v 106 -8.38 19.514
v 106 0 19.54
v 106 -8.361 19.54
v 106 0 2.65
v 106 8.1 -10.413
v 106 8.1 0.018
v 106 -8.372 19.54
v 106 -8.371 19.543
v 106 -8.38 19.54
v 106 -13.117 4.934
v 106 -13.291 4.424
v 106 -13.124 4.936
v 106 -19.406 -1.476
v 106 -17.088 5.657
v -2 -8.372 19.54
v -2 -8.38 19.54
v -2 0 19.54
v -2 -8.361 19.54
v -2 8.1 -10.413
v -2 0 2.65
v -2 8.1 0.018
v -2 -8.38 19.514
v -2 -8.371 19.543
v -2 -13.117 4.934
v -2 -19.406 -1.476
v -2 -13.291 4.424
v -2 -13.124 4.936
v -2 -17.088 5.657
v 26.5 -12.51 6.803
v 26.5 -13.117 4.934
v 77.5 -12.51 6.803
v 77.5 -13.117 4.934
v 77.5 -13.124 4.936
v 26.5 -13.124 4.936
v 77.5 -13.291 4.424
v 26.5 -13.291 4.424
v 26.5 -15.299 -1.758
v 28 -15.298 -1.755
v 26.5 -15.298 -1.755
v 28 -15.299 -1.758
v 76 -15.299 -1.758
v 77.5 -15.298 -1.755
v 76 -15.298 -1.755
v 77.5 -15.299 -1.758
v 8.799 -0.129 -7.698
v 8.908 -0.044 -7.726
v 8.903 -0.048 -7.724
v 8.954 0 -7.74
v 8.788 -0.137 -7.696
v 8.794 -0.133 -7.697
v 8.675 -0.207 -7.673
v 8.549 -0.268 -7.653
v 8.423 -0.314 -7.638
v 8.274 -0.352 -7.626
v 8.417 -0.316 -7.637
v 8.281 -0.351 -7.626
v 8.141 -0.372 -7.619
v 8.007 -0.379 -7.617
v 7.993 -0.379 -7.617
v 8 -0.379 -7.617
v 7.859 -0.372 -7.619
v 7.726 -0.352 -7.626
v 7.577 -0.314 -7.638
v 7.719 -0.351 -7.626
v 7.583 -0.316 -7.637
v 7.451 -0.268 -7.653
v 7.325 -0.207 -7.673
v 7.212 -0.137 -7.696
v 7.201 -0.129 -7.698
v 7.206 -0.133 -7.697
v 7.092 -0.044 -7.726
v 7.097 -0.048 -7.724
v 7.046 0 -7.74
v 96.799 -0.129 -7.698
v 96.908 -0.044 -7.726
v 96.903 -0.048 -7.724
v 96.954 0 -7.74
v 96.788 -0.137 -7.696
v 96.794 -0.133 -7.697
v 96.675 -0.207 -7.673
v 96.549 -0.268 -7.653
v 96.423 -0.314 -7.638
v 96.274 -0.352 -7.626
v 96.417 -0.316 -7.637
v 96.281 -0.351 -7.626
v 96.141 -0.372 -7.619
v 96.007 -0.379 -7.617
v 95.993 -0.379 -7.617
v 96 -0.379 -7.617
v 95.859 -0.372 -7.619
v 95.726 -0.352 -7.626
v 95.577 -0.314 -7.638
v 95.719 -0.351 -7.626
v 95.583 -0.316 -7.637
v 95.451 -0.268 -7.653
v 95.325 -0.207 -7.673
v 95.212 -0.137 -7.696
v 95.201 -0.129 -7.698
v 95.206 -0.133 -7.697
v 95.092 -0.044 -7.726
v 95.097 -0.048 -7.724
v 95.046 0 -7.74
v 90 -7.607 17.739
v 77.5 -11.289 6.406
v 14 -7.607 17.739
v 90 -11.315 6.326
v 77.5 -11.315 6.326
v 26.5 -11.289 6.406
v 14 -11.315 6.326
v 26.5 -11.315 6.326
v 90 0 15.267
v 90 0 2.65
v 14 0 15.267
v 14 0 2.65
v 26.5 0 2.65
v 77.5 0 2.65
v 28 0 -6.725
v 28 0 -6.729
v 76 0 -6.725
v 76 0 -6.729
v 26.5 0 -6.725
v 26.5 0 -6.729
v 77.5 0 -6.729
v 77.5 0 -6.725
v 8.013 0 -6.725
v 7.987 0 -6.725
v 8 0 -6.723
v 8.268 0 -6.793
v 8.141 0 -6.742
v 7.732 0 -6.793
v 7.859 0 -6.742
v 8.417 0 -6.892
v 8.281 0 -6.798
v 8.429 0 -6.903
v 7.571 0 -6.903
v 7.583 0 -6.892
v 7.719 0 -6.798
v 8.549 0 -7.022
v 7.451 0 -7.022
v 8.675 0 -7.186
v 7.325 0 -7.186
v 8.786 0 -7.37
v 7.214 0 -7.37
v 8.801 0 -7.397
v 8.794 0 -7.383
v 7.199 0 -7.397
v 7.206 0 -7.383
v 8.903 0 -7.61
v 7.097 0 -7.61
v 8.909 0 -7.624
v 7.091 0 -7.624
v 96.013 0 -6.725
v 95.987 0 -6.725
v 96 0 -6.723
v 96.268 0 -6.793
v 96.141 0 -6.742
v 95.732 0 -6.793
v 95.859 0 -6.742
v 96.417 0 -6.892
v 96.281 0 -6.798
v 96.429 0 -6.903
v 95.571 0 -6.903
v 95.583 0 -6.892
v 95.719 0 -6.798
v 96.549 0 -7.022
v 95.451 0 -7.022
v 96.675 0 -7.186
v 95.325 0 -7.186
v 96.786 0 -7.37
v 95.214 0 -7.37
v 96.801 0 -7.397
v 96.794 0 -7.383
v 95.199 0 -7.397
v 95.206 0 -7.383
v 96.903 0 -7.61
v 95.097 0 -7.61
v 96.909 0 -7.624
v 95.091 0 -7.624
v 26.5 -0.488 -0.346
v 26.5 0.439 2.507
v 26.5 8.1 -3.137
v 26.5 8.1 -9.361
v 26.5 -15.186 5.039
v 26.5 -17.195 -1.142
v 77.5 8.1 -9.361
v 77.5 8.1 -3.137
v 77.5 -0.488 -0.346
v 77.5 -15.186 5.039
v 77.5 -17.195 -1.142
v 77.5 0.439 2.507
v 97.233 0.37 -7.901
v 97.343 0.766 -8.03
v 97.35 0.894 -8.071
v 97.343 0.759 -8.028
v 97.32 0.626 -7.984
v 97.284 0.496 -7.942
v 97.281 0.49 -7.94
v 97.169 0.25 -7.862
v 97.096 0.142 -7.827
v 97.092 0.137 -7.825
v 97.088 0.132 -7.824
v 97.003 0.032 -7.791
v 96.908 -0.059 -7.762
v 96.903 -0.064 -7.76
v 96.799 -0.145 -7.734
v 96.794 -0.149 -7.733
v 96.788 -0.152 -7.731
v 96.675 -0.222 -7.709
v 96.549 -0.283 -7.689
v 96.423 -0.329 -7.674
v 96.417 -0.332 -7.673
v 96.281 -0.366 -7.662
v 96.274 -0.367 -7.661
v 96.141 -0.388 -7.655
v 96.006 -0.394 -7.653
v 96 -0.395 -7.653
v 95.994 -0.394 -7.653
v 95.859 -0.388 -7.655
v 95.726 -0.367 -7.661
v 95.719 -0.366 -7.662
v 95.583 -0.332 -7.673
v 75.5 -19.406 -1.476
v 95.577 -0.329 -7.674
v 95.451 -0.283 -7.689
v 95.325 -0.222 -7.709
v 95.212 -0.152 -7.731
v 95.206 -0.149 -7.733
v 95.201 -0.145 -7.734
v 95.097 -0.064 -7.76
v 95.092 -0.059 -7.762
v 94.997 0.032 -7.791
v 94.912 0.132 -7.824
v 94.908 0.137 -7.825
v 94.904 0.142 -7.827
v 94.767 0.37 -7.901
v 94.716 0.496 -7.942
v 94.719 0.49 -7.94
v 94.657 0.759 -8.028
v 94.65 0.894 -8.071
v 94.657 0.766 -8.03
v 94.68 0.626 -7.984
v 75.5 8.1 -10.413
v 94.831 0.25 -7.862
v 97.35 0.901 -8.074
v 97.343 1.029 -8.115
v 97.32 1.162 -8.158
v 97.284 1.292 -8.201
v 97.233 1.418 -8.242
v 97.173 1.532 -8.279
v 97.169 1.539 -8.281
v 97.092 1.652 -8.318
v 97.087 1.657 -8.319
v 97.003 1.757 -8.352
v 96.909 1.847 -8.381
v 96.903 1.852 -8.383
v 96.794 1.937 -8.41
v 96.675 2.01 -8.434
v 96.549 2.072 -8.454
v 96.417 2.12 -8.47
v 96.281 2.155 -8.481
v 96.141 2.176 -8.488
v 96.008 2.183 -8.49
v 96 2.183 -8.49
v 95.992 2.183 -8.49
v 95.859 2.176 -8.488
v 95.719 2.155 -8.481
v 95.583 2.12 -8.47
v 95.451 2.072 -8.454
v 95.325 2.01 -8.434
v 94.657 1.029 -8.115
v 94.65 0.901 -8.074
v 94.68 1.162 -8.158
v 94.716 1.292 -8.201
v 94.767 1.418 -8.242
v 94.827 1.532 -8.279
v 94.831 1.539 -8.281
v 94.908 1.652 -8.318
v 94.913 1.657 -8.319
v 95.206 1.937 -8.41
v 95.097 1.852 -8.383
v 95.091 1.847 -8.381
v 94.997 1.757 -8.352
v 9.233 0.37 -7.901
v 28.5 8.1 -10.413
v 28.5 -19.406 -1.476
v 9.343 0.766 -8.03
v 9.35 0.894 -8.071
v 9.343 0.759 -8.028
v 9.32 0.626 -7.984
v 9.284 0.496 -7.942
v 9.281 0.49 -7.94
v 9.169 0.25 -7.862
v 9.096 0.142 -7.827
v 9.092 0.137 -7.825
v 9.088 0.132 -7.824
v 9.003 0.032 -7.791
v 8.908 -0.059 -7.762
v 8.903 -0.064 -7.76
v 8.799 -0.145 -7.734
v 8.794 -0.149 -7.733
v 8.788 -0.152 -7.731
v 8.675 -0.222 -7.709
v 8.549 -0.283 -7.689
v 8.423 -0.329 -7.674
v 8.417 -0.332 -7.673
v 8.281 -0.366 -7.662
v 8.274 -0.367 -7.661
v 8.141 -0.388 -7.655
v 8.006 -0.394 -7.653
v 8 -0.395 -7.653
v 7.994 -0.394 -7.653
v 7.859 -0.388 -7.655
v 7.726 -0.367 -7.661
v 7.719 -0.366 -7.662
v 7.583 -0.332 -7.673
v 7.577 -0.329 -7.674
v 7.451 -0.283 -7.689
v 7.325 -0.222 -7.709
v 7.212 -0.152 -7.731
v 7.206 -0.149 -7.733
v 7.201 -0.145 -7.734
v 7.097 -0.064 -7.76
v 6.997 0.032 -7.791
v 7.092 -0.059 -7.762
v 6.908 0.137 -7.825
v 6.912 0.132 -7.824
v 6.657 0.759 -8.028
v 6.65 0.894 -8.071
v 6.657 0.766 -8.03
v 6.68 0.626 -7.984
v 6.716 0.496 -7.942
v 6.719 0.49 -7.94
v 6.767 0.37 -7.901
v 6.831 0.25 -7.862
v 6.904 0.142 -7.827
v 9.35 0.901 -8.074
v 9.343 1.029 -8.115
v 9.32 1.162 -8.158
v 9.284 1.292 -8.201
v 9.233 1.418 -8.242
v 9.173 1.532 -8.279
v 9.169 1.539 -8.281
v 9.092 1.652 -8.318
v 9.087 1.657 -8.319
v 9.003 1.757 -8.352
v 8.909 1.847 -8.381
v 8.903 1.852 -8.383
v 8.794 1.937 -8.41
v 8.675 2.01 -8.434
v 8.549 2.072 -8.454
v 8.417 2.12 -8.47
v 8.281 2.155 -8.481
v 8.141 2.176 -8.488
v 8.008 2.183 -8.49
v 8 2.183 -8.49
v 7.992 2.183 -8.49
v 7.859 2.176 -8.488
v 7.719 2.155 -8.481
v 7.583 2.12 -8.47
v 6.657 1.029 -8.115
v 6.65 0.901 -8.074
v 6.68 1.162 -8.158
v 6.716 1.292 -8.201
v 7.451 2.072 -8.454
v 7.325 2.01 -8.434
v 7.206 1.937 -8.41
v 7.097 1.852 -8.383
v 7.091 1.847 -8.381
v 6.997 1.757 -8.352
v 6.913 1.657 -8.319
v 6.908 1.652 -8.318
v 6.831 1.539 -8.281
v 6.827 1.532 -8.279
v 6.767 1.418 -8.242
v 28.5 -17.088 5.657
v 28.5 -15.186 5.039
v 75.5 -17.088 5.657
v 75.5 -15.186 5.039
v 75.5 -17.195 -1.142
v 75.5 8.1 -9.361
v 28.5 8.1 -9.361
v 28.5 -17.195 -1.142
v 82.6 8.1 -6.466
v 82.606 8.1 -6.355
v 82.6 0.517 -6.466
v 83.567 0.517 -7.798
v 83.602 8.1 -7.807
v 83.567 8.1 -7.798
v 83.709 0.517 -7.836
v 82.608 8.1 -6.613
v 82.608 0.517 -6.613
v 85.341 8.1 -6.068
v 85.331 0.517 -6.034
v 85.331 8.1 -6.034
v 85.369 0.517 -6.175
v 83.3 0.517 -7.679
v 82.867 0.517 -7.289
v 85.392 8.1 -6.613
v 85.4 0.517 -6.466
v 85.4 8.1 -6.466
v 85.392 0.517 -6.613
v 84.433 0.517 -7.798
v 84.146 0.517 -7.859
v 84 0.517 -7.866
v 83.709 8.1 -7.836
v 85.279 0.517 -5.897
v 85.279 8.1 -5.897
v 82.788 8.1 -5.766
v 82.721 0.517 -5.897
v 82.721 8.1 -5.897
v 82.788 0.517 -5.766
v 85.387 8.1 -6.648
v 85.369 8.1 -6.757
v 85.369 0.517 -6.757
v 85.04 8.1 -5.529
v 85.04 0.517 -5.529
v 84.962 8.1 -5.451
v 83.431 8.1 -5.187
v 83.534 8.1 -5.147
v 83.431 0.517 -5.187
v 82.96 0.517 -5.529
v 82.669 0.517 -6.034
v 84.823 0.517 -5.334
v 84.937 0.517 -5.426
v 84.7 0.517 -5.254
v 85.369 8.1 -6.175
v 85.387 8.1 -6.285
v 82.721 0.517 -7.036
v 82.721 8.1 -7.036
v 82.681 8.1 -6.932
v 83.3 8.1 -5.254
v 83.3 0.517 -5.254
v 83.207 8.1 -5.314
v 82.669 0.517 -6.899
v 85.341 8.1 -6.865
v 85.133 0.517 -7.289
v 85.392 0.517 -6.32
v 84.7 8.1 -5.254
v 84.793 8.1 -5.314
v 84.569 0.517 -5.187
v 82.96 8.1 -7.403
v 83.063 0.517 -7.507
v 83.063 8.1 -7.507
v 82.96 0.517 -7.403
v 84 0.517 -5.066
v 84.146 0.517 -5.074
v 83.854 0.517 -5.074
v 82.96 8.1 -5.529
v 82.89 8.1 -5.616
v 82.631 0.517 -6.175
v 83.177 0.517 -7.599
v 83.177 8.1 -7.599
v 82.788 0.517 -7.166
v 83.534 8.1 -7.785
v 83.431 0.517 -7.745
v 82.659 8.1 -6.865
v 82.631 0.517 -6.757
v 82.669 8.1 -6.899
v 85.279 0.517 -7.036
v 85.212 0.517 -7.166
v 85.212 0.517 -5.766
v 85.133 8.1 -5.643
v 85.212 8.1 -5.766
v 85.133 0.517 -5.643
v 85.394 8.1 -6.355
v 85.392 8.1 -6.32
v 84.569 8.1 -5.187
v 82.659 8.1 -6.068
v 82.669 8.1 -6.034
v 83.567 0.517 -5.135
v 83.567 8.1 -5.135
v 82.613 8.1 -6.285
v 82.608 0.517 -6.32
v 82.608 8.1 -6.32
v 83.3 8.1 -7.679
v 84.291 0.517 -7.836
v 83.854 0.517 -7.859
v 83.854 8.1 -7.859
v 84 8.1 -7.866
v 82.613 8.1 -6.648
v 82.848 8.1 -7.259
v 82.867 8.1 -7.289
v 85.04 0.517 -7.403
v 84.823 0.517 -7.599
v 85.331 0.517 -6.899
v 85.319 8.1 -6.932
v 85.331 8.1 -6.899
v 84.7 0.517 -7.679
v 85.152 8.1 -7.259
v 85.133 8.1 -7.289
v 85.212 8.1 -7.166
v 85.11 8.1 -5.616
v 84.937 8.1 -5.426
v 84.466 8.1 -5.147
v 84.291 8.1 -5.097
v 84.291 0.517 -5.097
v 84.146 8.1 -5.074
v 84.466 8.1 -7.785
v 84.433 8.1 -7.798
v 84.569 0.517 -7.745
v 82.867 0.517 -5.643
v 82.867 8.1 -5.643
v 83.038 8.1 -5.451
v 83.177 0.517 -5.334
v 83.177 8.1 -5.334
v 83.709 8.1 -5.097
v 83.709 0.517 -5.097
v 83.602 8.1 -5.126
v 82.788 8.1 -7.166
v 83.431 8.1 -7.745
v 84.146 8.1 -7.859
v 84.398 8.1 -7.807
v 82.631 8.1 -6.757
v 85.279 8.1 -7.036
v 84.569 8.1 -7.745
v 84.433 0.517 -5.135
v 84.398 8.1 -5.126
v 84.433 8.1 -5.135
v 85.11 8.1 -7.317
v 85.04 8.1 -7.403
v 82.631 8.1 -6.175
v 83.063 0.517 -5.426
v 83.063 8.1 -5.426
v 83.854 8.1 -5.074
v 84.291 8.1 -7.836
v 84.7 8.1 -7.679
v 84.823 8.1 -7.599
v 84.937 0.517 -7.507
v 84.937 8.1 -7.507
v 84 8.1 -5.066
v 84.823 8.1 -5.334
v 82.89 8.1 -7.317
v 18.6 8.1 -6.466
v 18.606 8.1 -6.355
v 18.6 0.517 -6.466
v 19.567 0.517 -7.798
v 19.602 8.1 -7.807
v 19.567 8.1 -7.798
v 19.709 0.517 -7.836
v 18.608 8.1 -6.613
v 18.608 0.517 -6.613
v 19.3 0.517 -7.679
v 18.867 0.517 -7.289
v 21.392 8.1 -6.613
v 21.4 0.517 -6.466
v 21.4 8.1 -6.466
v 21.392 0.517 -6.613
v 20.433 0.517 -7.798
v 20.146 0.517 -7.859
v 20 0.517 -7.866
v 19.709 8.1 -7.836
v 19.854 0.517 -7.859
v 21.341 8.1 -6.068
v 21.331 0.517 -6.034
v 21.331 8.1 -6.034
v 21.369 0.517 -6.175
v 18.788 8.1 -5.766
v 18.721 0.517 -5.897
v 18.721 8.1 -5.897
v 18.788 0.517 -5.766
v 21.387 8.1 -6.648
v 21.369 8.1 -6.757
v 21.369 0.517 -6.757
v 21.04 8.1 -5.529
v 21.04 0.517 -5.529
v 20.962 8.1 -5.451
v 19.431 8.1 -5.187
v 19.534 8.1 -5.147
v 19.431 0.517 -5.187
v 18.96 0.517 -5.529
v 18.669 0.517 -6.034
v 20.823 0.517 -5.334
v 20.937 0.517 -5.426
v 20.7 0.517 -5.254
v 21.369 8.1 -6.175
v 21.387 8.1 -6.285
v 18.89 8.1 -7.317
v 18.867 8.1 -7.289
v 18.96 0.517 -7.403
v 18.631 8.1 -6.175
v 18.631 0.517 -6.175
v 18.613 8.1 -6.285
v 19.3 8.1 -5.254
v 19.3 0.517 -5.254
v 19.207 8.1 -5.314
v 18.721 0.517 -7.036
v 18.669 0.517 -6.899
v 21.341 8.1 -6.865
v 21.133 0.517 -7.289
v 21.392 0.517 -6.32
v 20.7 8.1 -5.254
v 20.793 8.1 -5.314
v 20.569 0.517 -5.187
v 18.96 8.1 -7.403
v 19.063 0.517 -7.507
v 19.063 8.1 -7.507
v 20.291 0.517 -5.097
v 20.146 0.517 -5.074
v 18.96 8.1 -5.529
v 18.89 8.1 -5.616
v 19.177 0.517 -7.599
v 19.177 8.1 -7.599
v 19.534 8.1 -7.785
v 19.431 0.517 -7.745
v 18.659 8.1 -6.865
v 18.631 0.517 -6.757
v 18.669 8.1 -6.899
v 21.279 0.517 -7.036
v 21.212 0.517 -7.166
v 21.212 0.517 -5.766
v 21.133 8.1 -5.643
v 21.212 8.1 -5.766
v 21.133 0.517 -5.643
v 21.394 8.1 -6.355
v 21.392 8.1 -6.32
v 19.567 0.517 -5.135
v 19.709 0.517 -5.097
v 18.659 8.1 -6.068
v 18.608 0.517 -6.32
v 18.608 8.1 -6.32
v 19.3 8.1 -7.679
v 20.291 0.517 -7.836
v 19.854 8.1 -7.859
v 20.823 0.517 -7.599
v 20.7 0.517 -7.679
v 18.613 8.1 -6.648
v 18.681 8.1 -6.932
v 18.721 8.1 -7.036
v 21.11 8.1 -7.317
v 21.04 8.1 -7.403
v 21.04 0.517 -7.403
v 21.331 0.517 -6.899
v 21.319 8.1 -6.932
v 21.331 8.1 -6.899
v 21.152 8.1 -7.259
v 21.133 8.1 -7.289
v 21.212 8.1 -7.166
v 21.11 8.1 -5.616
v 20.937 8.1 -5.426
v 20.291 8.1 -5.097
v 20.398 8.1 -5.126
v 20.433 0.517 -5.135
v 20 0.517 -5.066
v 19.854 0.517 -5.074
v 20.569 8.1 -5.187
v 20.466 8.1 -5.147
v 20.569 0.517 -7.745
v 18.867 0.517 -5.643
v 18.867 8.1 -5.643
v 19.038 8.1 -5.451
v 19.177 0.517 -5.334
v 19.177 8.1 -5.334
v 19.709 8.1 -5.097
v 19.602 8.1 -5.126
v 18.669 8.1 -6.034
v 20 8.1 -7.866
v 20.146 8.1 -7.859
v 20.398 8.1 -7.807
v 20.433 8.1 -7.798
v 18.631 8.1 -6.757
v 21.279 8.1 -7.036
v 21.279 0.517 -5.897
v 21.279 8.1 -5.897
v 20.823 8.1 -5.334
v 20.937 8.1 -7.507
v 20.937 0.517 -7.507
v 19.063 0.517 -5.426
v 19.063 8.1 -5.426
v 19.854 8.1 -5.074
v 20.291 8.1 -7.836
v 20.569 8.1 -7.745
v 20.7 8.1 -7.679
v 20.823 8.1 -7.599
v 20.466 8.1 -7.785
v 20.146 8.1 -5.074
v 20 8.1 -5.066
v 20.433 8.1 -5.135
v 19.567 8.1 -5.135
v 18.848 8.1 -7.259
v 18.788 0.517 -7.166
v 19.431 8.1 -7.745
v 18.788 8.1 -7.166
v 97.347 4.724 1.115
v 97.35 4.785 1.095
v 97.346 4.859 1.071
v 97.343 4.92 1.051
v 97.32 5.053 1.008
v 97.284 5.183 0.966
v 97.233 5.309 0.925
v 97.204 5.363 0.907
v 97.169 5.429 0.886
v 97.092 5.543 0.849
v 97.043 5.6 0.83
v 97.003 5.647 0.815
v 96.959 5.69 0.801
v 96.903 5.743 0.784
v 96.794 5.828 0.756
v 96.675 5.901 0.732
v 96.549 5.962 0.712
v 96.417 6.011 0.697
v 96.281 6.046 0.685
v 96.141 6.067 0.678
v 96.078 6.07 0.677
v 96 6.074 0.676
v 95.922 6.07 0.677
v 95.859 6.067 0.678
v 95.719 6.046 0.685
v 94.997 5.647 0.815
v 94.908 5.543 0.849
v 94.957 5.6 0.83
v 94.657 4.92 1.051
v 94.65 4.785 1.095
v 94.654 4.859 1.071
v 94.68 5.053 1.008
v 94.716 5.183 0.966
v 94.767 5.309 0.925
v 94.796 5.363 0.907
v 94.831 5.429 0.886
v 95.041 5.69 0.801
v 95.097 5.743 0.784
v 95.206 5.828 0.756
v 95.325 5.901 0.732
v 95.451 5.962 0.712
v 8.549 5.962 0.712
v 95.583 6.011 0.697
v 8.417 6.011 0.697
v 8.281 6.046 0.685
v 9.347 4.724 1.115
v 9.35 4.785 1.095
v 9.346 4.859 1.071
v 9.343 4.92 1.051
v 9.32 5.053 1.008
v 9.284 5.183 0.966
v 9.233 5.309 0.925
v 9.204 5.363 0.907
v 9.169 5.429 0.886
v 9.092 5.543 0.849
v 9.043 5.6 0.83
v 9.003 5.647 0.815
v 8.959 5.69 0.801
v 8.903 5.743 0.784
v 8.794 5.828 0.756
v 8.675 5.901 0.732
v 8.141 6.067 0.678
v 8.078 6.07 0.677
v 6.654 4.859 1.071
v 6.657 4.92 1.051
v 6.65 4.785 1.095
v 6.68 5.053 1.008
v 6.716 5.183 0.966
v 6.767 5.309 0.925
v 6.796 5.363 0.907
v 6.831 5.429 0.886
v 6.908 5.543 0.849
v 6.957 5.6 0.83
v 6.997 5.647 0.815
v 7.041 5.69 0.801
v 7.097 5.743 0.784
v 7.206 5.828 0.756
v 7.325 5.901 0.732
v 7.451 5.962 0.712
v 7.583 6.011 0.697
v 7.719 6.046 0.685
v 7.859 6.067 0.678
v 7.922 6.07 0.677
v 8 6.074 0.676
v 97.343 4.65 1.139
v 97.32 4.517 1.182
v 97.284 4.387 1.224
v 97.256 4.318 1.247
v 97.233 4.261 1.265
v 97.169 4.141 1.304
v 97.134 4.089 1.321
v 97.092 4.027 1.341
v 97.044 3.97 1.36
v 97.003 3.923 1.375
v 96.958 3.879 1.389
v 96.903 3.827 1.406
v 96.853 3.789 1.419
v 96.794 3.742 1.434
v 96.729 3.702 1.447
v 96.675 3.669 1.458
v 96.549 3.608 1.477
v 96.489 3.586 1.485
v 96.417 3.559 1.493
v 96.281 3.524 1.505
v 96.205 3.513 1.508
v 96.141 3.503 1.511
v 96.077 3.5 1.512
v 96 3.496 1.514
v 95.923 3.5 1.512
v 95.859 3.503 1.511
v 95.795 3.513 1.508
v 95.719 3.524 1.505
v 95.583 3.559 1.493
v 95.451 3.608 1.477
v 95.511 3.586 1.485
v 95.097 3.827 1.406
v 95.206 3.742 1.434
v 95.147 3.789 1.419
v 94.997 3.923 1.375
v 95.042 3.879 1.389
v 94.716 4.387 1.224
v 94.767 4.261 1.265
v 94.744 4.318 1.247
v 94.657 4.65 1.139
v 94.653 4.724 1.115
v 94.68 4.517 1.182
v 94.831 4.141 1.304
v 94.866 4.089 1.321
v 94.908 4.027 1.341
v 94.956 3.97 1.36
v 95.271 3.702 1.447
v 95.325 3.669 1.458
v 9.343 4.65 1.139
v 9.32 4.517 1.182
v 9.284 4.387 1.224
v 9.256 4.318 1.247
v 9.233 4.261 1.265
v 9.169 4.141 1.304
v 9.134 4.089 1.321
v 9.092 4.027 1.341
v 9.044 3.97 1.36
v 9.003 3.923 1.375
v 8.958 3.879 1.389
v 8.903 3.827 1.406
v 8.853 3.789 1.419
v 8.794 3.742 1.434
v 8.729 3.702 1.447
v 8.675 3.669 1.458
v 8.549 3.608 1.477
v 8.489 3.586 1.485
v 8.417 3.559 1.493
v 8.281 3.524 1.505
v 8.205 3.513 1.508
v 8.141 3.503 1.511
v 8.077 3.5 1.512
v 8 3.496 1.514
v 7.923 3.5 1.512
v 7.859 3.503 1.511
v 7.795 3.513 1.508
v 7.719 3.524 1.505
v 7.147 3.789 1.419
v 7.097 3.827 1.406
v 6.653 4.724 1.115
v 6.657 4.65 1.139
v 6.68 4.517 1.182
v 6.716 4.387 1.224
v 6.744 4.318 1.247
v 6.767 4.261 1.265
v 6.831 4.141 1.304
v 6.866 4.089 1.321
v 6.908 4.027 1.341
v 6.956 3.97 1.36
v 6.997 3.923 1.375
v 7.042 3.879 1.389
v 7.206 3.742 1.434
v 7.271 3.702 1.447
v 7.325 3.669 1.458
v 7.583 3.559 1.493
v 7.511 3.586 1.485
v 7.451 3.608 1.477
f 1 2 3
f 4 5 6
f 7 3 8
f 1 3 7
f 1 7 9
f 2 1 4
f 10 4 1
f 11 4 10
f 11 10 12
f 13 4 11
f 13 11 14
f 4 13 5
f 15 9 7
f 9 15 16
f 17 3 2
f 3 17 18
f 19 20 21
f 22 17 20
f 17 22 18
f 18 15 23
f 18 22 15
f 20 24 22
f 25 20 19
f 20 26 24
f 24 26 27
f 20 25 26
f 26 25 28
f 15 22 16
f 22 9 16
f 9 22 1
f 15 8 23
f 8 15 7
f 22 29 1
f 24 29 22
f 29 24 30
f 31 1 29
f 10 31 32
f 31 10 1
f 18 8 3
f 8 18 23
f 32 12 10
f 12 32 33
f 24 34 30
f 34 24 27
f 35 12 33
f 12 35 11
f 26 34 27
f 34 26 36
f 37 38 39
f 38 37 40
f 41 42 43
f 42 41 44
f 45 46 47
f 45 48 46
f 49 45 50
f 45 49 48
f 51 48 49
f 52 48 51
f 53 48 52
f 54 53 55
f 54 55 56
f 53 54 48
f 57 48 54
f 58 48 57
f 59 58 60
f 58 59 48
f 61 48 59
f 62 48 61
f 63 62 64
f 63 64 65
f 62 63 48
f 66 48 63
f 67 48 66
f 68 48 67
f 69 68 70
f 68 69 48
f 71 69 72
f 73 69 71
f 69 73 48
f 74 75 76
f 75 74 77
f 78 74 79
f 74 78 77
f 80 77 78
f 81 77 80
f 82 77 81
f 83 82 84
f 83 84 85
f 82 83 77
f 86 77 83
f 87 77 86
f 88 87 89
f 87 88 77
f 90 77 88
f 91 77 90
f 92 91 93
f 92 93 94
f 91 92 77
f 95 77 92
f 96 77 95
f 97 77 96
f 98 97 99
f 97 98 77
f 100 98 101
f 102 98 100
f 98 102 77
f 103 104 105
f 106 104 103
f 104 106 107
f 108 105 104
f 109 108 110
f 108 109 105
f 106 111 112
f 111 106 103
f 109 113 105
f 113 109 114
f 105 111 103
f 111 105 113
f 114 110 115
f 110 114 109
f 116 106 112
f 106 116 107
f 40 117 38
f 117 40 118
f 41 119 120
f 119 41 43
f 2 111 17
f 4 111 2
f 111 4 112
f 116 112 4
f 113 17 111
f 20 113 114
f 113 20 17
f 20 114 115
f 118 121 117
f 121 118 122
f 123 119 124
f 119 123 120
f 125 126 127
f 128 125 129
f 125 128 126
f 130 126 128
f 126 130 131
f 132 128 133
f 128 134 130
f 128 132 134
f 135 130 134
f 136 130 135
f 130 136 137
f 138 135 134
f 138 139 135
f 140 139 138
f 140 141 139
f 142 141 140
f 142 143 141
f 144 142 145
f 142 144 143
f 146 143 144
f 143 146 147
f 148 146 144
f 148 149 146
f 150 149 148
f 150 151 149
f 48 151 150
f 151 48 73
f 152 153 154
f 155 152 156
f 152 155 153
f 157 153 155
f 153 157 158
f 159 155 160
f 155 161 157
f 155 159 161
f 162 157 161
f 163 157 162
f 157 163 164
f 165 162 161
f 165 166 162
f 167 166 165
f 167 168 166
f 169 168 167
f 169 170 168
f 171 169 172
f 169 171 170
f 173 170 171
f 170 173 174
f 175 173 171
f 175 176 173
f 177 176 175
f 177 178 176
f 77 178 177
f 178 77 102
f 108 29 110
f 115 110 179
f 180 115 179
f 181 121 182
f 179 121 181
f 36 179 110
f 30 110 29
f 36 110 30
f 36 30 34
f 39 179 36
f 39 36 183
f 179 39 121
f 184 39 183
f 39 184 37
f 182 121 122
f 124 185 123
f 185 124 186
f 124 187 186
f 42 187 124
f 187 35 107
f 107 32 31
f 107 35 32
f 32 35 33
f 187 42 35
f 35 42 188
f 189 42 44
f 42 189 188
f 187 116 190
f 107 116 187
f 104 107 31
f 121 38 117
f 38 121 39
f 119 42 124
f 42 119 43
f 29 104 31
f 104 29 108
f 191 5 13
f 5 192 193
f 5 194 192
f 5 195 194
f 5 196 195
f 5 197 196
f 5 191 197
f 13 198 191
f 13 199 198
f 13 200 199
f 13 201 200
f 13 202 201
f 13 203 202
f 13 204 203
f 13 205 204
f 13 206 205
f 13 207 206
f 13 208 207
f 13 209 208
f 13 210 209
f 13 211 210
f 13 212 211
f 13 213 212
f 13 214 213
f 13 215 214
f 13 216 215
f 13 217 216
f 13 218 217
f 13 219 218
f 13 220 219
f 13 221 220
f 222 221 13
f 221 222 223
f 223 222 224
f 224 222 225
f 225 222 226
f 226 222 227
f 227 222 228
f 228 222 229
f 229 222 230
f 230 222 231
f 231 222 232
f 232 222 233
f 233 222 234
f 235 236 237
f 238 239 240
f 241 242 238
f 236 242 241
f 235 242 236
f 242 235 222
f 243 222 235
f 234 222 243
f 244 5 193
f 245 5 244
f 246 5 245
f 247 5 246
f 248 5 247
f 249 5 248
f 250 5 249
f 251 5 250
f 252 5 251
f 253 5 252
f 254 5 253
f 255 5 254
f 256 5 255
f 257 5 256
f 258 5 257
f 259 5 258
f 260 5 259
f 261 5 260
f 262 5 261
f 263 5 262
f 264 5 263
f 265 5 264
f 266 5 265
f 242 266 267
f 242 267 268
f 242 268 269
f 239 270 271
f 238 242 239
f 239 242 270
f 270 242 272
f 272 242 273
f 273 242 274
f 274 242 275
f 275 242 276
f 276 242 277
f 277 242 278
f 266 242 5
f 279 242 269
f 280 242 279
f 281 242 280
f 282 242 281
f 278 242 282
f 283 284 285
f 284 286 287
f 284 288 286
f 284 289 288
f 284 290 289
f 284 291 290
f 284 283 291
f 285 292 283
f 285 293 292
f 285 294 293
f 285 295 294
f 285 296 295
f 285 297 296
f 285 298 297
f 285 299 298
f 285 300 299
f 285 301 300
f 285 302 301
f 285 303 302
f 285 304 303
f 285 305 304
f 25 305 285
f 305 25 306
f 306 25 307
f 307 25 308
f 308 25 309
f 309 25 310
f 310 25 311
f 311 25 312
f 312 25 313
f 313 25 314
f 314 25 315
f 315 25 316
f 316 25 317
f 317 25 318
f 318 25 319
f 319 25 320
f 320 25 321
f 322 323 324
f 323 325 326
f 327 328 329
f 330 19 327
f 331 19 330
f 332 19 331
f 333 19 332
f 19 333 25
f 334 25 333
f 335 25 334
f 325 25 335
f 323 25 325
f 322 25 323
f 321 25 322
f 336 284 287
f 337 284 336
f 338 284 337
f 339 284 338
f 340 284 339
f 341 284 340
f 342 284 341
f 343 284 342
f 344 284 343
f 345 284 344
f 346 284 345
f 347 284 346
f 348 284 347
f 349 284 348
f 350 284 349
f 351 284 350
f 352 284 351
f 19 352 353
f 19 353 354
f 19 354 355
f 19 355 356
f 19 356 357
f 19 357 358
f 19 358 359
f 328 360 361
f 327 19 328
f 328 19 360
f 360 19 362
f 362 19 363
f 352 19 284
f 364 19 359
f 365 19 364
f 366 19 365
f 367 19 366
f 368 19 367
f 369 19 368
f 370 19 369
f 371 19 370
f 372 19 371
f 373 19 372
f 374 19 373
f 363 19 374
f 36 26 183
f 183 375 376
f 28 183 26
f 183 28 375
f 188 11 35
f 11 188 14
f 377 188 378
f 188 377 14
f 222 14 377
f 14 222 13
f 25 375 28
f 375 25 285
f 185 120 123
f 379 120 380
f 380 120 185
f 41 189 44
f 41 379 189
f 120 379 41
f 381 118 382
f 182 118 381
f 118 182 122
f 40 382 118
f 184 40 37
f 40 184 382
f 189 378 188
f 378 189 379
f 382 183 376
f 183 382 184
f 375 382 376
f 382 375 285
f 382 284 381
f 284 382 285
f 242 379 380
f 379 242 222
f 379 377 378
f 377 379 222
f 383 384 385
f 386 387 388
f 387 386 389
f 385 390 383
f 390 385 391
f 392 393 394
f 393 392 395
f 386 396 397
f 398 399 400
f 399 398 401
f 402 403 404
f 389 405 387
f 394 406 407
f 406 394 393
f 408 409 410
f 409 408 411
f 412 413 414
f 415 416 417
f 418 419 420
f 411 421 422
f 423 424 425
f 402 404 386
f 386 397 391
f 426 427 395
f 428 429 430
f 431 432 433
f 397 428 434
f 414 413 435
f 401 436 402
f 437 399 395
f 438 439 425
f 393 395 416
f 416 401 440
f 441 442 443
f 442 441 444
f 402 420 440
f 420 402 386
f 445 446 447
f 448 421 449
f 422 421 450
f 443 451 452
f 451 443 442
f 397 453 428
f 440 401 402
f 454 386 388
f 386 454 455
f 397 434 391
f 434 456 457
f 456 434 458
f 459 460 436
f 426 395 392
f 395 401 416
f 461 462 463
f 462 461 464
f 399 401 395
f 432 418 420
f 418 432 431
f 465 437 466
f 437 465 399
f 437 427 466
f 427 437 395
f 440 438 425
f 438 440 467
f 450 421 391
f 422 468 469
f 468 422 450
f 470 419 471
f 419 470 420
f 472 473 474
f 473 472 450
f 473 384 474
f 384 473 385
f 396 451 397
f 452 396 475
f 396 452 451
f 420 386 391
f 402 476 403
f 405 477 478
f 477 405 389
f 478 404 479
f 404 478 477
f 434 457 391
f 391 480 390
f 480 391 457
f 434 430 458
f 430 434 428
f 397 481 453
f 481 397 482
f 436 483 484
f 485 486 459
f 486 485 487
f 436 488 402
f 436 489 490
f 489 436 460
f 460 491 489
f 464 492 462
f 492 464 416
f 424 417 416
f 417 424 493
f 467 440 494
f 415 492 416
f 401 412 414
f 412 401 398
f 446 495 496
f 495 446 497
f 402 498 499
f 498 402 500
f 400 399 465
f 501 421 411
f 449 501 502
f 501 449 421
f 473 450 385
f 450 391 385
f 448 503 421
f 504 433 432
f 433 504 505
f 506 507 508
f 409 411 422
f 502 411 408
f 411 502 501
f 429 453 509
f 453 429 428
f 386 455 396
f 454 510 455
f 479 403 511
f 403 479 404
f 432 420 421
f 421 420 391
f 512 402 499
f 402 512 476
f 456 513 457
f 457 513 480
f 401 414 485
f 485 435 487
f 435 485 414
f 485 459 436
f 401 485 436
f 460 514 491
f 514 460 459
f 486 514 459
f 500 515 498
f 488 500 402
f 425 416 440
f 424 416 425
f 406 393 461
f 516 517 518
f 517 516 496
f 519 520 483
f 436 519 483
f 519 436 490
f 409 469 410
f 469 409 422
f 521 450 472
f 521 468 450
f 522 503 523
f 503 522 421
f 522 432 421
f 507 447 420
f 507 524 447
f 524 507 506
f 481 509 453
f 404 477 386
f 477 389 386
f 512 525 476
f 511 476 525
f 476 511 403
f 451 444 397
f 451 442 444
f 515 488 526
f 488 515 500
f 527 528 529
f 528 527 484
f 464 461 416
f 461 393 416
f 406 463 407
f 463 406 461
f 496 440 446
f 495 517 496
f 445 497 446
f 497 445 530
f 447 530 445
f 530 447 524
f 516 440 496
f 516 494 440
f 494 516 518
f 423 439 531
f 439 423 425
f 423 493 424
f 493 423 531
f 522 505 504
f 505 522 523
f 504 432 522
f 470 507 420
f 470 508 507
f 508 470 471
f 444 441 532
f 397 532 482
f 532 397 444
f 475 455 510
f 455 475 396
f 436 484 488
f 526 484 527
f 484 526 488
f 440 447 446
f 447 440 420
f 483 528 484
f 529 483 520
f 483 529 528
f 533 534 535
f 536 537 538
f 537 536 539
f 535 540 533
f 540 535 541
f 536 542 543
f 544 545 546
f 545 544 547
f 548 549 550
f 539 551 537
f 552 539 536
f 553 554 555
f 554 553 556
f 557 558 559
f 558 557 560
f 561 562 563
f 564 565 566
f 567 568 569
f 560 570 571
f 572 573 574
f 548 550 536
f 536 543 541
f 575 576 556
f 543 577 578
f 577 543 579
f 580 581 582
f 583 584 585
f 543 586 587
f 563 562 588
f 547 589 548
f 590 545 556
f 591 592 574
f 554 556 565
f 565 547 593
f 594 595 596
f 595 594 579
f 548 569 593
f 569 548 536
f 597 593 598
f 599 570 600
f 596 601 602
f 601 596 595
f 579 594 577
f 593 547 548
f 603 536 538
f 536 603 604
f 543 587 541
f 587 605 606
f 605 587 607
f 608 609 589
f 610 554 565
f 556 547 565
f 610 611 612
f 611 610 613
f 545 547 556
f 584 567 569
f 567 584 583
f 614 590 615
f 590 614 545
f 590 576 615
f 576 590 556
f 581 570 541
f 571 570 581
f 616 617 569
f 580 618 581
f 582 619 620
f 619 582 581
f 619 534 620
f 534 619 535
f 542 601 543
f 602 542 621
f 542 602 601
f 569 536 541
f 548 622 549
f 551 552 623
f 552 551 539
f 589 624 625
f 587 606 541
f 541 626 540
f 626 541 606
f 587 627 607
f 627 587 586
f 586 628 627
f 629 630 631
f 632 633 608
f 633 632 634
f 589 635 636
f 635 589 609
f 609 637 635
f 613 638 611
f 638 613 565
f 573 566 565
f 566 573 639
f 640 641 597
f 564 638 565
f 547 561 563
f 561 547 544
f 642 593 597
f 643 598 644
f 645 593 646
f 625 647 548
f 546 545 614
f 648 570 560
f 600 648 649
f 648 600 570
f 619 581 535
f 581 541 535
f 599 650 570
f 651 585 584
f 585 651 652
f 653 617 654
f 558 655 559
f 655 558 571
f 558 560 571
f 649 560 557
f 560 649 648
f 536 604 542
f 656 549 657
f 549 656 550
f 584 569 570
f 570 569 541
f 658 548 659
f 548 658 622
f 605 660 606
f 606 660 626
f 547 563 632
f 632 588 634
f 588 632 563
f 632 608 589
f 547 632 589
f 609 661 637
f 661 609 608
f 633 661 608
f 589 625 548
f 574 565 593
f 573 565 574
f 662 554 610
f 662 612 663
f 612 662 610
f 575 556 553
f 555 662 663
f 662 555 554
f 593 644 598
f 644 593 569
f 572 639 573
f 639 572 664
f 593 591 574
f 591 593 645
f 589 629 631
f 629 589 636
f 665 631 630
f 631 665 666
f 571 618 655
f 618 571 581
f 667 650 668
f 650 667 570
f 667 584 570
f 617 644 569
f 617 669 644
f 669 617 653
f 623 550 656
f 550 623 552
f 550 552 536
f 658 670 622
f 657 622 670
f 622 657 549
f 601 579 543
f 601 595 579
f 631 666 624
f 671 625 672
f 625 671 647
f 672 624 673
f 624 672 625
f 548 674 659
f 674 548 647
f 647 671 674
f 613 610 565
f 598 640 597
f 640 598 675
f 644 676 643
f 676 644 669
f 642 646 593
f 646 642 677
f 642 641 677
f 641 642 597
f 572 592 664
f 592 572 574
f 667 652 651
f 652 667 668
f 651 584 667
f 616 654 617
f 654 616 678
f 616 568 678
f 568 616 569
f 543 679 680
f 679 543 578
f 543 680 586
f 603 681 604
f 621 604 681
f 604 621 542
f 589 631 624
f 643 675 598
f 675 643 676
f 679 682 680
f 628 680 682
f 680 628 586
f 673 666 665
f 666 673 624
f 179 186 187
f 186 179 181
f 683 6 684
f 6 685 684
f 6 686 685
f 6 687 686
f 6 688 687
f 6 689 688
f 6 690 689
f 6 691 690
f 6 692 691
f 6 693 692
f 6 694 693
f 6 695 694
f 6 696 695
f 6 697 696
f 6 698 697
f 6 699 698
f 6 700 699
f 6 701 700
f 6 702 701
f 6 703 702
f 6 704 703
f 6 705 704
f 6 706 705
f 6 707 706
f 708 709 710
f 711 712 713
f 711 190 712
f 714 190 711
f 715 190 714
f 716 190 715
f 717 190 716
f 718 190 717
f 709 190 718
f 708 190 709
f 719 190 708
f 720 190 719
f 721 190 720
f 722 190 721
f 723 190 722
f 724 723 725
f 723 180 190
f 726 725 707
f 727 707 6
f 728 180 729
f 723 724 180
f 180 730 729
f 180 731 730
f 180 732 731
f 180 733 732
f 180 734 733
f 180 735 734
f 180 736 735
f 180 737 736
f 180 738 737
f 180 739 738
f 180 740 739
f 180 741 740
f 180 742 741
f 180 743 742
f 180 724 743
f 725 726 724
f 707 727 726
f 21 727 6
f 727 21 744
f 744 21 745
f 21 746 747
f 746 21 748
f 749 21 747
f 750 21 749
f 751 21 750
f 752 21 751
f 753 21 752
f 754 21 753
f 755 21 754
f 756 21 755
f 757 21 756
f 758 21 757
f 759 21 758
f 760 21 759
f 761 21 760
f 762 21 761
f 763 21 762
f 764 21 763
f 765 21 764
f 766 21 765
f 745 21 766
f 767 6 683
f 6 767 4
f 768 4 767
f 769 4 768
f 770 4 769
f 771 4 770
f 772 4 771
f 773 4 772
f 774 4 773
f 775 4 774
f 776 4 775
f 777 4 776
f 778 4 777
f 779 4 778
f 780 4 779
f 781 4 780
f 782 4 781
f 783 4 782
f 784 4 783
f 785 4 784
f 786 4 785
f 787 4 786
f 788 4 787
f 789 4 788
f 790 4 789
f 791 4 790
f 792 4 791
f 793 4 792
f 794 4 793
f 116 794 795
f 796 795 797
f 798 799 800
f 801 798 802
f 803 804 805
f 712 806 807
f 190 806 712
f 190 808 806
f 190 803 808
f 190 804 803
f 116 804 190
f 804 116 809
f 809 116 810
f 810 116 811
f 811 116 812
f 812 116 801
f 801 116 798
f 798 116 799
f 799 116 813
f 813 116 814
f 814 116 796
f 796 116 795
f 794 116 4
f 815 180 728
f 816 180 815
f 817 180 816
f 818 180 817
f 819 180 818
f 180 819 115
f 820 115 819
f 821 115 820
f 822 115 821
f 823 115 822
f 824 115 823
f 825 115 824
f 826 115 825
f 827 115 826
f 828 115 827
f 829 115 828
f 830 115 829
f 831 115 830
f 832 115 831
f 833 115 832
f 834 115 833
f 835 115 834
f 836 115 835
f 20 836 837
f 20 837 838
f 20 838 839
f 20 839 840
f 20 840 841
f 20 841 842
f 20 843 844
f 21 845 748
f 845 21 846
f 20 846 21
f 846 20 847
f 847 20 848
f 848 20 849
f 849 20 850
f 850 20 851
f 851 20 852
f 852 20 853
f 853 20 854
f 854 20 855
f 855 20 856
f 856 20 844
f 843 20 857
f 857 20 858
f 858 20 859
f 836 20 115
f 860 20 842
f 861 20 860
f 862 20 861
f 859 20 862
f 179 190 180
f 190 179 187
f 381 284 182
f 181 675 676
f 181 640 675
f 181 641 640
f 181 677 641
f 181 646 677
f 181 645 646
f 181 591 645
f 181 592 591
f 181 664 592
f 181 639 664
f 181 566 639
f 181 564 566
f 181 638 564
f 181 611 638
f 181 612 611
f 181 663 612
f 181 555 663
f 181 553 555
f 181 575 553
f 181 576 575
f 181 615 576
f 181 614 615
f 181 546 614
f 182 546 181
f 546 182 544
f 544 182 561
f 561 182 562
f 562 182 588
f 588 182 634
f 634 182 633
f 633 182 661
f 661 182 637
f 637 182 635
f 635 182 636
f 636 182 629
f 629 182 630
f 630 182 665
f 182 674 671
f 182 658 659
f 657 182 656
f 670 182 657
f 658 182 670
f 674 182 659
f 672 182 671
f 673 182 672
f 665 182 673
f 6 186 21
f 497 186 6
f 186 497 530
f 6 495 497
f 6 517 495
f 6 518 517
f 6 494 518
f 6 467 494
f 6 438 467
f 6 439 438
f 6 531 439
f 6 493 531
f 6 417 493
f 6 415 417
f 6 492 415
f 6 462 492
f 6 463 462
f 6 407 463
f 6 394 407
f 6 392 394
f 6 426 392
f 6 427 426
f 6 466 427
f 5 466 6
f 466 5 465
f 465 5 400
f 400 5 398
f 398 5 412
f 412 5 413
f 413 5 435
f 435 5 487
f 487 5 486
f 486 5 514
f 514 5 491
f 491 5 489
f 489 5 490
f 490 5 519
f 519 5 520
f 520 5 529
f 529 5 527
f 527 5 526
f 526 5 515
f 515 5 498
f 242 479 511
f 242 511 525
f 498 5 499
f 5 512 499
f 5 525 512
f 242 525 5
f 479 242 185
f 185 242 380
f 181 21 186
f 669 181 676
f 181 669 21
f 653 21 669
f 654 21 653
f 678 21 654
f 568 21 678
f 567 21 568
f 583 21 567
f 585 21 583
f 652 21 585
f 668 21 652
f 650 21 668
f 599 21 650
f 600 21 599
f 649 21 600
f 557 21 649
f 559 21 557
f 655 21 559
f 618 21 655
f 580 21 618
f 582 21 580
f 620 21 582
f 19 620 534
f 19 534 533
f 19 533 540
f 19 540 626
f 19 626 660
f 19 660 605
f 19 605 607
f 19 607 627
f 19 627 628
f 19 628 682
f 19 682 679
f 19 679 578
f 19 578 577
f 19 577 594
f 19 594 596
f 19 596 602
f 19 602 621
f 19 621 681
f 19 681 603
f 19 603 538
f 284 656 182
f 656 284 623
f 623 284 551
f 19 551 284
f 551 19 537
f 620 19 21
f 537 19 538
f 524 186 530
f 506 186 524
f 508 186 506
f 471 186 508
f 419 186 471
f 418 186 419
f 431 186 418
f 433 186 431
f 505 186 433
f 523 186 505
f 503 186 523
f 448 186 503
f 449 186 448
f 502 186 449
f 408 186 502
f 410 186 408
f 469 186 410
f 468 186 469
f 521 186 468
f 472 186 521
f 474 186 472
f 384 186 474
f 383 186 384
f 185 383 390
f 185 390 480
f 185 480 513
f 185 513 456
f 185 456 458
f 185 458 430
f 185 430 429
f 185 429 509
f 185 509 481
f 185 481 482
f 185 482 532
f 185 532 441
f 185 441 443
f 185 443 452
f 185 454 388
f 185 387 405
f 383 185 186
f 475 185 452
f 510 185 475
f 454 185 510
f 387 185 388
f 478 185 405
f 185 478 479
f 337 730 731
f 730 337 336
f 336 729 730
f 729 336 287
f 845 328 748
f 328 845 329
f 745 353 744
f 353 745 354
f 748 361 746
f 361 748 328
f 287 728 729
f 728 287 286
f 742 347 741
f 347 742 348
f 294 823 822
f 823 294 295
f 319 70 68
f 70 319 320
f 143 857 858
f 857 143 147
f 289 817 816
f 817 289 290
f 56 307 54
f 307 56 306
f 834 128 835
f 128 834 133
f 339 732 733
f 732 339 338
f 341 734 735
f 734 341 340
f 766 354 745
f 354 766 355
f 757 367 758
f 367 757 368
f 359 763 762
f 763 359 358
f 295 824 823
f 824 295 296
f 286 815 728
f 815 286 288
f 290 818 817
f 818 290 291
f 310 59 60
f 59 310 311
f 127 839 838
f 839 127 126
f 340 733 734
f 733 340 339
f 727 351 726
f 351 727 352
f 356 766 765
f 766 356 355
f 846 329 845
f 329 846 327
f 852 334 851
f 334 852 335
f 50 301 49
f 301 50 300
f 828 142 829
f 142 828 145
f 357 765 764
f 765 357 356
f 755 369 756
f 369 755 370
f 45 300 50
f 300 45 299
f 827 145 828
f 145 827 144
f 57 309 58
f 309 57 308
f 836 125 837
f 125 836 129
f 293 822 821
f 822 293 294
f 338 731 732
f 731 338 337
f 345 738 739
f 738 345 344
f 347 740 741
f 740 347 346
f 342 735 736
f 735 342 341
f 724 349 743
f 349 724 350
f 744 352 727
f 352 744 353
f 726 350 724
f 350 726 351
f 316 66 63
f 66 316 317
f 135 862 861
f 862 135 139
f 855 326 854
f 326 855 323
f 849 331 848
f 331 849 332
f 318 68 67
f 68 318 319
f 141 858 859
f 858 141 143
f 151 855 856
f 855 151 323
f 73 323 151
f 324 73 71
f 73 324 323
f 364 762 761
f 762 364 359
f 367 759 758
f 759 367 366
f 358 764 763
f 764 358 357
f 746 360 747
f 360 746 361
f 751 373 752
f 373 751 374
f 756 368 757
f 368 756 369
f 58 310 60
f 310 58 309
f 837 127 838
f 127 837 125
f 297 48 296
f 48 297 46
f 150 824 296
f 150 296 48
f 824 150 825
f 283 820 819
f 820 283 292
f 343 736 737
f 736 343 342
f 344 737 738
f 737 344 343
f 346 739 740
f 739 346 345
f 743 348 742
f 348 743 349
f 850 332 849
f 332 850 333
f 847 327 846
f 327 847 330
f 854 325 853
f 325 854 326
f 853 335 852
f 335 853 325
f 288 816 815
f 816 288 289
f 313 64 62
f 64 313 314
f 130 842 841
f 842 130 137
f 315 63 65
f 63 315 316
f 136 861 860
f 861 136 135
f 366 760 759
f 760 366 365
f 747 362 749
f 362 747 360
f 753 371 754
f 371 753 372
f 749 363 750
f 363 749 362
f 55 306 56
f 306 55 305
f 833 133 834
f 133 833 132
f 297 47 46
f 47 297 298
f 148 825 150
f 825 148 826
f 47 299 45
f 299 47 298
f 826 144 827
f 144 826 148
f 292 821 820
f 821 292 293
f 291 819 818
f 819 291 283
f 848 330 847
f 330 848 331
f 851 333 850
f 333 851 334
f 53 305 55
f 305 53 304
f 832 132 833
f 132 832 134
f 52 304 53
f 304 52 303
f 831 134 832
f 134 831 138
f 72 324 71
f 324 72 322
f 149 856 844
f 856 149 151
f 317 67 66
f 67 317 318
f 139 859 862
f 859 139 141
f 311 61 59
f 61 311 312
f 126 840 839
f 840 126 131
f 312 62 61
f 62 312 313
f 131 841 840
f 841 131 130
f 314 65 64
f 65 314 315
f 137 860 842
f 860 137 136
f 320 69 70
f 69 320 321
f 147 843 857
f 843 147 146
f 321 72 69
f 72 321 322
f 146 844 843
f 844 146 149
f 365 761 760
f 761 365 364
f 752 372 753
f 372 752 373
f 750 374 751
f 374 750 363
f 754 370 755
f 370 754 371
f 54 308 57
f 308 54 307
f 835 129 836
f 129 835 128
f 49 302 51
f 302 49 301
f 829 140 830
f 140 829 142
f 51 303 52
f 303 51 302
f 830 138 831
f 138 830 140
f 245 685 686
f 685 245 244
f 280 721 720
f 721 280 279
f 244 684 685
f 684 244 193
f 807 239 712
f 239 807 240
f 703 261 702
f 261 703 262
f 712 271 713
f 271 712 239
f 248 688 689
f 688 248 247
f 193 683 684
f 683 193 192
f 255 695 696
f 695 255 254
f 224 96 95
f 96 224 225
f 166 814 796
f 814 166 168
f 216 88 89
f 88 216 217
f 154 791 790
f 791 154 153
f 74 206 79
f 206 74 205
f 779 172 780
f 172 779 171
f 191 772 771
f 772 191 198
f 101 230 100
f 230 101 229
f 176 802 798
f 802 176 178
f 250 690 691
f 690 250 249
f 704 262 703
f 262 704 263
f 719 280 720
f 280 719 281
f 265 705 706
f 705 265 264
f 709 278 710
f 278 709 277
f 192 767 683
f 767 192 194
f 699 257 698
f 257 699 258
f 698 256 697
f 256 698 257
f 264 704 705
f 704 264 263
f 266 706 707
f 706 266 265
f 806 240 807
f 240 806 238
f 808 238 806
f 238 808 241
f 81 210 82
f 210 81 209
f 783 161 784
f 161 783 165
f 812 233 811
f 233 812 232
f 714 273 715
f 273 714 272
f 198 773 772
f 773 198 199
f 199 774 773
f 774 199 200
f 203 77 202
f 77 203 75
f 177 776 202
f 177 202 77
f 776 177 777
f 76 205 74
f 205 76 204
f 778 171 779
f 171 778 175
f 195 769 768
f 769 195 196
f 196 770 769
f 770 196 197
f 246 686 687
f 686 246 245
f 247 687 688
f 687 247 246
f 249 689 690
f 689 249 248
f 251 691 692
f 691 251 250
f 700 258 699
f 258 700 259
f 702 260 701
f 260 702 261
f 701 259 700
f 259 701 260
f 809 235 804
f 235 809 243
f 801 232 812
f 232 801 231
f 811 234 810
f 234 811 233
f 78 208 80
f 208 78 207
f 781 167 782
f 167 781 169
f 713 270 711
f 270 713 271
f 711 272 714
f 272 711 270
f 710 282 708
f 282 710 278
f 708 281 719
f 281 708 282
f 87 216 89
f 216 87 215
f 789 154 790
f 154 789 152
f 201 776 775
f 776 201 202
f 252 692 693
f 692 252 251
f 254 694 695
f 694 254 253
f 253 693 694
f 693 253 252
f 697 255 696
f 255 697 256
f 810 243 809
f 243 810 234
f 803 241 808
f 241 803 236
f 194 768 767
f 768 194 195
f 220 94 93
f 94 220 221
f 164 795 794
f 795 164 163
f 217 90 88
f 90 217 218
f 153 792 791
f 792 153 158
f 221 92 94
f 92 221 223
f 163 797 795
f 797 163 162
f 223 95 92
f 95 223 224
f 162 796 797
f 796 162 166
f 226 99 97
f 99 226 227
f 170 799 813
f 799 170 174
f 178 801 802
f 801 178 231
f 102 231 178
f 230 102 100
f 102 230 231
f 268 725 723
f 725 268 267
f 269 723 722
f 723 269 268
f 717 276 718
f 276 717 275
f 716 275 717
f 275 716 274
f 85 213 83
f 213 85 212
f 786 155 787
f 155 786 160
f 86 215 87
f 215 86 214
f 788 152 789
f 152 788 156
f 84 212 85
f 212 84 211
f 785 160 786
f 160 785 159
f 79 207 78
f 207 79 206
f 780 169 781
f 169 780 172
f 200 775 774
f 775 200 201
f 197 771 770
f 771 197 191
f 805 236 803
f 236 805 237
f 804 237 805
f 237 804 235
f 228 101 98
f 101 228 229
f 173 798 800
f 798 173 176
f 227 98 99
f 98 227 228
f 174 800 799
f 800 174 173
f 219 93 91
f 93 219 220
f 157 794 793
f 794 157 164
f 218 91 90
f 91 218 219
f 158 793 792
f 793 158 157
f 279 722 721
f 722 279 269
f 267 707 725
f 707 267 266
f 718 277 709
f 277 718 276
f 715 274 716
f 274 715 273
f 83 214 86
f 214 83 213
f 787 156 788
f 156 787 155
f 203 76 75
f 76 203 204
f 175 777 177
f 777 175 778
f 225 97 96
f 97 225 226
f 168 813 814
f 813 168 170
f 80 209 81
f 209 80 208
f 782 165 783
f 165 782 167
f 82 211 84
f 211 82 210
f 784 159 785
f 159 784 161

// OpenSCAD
//LED housing UVA top

$fn=60;


UVA_housing();
//translate([0, 0, -11]) UVA_support();
//filterholder();
//UVA_filter_protect();




module UVA_housing() {
difference() {
union() {
    translate([-2,-8.38,14.54]) 
    cube([108,10,5]);
    rotate ([72,0,0]) translate([-2, 0, 0]) cube([108,16,14]); 
    translate([-2, 0.8, -8]) rotate([72,0,0])
    cube([108, 8, 17.24]);
    //rotate([18, 180, 0]) translate([-80-24, -18, -0.1]) filterholder();
    //rotate([18, 180, 0]) translate([-80-24, -5, -2.52]) cube([104, 13.8, 3]);
    
    }
    
    translate([14,2,2]) rotate([72,0,0]) 
    cube([76,12,14]);
    translate([28, 4, 1.4]) rotate([162,0,0]) 
    cube ([48,18,13]);
    translate([-3, 0, -8]) cube([110, 5, 28]);
    translate([26.5,3,-7.7]) rotate([72,0,0]) cube([51,9,25]);
    //holes for filter_protect
    translate([20, 5, -4]) rotate([90-18, 0, 0]) cylinder(d=2.8, h=10);
    translate([104-20, 5, -4]) rotate([90-18, 0, 0]) cylinder(d=2.8, h=10); 
    
    
    }
    difference() {
        union() {
            rotate([18, 180, 0]) translate([-80-24, -18, -0.1]) filterholder();
            rotate([18, 180, 0]) translate([-106, -5, -2.52]) cube([108, 13.8, 3]);
        }
    translate([26.5, -2, -5]) rotate([72, 0, 0]) cube([51, 10, 15]);
    translate([-3, 8.1, -15]) cube([110, 5, 28]);
        
        //holes for LED board
    translate([8, 0.5, -9]) rotate([-23, 0, 0]) cylinder(d=2.7, h=20);
    translate([104-8, 0.5, -9]) rotate([-23, 0, 0]) cylinder(d=2.7, h=20);
    }
    //translate([0, 0, -7.8]) cube([4, 4, 27.4]);
}

//Support for UVA board
module UVA_support() {
difference() {
    rotate([0,90,0]) translate([-2.65,0,0])
linear_extrude(height = 104, scale = 1) 
//polygon(points=[[0,0],[10.5,0],[6, 14.409]]);
polygon(points=[[0,0],[20,0],[4, 9.6]]);
    rotate([0,90,0]) translate([-3, 0, 14])
    cube([30,30,76]);
    }
    /*translate([14, 2.2, -8]) cube([3, 2, 9]);
    translate([14, 0, -10]) cube([3, 4.2, 2]);
    translate([88, 2.2, -8]) cube([3, 2, 9]);
    translate([88, 0, -10]) cube([3, 4.2, 2]);
    //test
    color("black", 0.6) {translate([14, 0, -8]) cube([76, 2, 10]); }  */
}

/*module filterholder() {
difference() {
cube([56, 26, 7.5]);
translate([2.5, 1, -1]) cube([51, 26, 7.5]);
#translate([4, -1, -1]) cube([48, 28, 10]);
translate([-1, 23.5, 0]) rotate([-18.2, 0, 0]) cube([60, 3, 9.5]); 
}
} */

module filterholder() {
    difference() {
        translate([-2, 0, 0]) cube([108, 29, 7.5]);
        translate([2.5+24, 2, -2.5]) cube([51, 28, 9]);
        translate([4+24+0.5, -1, -1]) cube([47, 30, 10]);
        translate([-3, 26.5, 0]) rotate([-18.2, 0, 0]) cube([110, 3, 9.5]); 
        //holes for filter_protect
    translate([20, 30, 3]) rotate([90-18, 0, 0]) cylinder(d=2.8, h=10);
    translate([104-20, 30, 3]) rotate([90-18, 0, 0]) cylinder(d=2.8, h=10); 
}
}

module UVA_filter_protect() {
    difference() {
        cube([76, 10, 2]);
        translate([6, 5, -1]) cylinder(d=3.2, h=4);
        translate([6+64, 5, -1]) cylinder(d=3.2, h=4);
    }
}
